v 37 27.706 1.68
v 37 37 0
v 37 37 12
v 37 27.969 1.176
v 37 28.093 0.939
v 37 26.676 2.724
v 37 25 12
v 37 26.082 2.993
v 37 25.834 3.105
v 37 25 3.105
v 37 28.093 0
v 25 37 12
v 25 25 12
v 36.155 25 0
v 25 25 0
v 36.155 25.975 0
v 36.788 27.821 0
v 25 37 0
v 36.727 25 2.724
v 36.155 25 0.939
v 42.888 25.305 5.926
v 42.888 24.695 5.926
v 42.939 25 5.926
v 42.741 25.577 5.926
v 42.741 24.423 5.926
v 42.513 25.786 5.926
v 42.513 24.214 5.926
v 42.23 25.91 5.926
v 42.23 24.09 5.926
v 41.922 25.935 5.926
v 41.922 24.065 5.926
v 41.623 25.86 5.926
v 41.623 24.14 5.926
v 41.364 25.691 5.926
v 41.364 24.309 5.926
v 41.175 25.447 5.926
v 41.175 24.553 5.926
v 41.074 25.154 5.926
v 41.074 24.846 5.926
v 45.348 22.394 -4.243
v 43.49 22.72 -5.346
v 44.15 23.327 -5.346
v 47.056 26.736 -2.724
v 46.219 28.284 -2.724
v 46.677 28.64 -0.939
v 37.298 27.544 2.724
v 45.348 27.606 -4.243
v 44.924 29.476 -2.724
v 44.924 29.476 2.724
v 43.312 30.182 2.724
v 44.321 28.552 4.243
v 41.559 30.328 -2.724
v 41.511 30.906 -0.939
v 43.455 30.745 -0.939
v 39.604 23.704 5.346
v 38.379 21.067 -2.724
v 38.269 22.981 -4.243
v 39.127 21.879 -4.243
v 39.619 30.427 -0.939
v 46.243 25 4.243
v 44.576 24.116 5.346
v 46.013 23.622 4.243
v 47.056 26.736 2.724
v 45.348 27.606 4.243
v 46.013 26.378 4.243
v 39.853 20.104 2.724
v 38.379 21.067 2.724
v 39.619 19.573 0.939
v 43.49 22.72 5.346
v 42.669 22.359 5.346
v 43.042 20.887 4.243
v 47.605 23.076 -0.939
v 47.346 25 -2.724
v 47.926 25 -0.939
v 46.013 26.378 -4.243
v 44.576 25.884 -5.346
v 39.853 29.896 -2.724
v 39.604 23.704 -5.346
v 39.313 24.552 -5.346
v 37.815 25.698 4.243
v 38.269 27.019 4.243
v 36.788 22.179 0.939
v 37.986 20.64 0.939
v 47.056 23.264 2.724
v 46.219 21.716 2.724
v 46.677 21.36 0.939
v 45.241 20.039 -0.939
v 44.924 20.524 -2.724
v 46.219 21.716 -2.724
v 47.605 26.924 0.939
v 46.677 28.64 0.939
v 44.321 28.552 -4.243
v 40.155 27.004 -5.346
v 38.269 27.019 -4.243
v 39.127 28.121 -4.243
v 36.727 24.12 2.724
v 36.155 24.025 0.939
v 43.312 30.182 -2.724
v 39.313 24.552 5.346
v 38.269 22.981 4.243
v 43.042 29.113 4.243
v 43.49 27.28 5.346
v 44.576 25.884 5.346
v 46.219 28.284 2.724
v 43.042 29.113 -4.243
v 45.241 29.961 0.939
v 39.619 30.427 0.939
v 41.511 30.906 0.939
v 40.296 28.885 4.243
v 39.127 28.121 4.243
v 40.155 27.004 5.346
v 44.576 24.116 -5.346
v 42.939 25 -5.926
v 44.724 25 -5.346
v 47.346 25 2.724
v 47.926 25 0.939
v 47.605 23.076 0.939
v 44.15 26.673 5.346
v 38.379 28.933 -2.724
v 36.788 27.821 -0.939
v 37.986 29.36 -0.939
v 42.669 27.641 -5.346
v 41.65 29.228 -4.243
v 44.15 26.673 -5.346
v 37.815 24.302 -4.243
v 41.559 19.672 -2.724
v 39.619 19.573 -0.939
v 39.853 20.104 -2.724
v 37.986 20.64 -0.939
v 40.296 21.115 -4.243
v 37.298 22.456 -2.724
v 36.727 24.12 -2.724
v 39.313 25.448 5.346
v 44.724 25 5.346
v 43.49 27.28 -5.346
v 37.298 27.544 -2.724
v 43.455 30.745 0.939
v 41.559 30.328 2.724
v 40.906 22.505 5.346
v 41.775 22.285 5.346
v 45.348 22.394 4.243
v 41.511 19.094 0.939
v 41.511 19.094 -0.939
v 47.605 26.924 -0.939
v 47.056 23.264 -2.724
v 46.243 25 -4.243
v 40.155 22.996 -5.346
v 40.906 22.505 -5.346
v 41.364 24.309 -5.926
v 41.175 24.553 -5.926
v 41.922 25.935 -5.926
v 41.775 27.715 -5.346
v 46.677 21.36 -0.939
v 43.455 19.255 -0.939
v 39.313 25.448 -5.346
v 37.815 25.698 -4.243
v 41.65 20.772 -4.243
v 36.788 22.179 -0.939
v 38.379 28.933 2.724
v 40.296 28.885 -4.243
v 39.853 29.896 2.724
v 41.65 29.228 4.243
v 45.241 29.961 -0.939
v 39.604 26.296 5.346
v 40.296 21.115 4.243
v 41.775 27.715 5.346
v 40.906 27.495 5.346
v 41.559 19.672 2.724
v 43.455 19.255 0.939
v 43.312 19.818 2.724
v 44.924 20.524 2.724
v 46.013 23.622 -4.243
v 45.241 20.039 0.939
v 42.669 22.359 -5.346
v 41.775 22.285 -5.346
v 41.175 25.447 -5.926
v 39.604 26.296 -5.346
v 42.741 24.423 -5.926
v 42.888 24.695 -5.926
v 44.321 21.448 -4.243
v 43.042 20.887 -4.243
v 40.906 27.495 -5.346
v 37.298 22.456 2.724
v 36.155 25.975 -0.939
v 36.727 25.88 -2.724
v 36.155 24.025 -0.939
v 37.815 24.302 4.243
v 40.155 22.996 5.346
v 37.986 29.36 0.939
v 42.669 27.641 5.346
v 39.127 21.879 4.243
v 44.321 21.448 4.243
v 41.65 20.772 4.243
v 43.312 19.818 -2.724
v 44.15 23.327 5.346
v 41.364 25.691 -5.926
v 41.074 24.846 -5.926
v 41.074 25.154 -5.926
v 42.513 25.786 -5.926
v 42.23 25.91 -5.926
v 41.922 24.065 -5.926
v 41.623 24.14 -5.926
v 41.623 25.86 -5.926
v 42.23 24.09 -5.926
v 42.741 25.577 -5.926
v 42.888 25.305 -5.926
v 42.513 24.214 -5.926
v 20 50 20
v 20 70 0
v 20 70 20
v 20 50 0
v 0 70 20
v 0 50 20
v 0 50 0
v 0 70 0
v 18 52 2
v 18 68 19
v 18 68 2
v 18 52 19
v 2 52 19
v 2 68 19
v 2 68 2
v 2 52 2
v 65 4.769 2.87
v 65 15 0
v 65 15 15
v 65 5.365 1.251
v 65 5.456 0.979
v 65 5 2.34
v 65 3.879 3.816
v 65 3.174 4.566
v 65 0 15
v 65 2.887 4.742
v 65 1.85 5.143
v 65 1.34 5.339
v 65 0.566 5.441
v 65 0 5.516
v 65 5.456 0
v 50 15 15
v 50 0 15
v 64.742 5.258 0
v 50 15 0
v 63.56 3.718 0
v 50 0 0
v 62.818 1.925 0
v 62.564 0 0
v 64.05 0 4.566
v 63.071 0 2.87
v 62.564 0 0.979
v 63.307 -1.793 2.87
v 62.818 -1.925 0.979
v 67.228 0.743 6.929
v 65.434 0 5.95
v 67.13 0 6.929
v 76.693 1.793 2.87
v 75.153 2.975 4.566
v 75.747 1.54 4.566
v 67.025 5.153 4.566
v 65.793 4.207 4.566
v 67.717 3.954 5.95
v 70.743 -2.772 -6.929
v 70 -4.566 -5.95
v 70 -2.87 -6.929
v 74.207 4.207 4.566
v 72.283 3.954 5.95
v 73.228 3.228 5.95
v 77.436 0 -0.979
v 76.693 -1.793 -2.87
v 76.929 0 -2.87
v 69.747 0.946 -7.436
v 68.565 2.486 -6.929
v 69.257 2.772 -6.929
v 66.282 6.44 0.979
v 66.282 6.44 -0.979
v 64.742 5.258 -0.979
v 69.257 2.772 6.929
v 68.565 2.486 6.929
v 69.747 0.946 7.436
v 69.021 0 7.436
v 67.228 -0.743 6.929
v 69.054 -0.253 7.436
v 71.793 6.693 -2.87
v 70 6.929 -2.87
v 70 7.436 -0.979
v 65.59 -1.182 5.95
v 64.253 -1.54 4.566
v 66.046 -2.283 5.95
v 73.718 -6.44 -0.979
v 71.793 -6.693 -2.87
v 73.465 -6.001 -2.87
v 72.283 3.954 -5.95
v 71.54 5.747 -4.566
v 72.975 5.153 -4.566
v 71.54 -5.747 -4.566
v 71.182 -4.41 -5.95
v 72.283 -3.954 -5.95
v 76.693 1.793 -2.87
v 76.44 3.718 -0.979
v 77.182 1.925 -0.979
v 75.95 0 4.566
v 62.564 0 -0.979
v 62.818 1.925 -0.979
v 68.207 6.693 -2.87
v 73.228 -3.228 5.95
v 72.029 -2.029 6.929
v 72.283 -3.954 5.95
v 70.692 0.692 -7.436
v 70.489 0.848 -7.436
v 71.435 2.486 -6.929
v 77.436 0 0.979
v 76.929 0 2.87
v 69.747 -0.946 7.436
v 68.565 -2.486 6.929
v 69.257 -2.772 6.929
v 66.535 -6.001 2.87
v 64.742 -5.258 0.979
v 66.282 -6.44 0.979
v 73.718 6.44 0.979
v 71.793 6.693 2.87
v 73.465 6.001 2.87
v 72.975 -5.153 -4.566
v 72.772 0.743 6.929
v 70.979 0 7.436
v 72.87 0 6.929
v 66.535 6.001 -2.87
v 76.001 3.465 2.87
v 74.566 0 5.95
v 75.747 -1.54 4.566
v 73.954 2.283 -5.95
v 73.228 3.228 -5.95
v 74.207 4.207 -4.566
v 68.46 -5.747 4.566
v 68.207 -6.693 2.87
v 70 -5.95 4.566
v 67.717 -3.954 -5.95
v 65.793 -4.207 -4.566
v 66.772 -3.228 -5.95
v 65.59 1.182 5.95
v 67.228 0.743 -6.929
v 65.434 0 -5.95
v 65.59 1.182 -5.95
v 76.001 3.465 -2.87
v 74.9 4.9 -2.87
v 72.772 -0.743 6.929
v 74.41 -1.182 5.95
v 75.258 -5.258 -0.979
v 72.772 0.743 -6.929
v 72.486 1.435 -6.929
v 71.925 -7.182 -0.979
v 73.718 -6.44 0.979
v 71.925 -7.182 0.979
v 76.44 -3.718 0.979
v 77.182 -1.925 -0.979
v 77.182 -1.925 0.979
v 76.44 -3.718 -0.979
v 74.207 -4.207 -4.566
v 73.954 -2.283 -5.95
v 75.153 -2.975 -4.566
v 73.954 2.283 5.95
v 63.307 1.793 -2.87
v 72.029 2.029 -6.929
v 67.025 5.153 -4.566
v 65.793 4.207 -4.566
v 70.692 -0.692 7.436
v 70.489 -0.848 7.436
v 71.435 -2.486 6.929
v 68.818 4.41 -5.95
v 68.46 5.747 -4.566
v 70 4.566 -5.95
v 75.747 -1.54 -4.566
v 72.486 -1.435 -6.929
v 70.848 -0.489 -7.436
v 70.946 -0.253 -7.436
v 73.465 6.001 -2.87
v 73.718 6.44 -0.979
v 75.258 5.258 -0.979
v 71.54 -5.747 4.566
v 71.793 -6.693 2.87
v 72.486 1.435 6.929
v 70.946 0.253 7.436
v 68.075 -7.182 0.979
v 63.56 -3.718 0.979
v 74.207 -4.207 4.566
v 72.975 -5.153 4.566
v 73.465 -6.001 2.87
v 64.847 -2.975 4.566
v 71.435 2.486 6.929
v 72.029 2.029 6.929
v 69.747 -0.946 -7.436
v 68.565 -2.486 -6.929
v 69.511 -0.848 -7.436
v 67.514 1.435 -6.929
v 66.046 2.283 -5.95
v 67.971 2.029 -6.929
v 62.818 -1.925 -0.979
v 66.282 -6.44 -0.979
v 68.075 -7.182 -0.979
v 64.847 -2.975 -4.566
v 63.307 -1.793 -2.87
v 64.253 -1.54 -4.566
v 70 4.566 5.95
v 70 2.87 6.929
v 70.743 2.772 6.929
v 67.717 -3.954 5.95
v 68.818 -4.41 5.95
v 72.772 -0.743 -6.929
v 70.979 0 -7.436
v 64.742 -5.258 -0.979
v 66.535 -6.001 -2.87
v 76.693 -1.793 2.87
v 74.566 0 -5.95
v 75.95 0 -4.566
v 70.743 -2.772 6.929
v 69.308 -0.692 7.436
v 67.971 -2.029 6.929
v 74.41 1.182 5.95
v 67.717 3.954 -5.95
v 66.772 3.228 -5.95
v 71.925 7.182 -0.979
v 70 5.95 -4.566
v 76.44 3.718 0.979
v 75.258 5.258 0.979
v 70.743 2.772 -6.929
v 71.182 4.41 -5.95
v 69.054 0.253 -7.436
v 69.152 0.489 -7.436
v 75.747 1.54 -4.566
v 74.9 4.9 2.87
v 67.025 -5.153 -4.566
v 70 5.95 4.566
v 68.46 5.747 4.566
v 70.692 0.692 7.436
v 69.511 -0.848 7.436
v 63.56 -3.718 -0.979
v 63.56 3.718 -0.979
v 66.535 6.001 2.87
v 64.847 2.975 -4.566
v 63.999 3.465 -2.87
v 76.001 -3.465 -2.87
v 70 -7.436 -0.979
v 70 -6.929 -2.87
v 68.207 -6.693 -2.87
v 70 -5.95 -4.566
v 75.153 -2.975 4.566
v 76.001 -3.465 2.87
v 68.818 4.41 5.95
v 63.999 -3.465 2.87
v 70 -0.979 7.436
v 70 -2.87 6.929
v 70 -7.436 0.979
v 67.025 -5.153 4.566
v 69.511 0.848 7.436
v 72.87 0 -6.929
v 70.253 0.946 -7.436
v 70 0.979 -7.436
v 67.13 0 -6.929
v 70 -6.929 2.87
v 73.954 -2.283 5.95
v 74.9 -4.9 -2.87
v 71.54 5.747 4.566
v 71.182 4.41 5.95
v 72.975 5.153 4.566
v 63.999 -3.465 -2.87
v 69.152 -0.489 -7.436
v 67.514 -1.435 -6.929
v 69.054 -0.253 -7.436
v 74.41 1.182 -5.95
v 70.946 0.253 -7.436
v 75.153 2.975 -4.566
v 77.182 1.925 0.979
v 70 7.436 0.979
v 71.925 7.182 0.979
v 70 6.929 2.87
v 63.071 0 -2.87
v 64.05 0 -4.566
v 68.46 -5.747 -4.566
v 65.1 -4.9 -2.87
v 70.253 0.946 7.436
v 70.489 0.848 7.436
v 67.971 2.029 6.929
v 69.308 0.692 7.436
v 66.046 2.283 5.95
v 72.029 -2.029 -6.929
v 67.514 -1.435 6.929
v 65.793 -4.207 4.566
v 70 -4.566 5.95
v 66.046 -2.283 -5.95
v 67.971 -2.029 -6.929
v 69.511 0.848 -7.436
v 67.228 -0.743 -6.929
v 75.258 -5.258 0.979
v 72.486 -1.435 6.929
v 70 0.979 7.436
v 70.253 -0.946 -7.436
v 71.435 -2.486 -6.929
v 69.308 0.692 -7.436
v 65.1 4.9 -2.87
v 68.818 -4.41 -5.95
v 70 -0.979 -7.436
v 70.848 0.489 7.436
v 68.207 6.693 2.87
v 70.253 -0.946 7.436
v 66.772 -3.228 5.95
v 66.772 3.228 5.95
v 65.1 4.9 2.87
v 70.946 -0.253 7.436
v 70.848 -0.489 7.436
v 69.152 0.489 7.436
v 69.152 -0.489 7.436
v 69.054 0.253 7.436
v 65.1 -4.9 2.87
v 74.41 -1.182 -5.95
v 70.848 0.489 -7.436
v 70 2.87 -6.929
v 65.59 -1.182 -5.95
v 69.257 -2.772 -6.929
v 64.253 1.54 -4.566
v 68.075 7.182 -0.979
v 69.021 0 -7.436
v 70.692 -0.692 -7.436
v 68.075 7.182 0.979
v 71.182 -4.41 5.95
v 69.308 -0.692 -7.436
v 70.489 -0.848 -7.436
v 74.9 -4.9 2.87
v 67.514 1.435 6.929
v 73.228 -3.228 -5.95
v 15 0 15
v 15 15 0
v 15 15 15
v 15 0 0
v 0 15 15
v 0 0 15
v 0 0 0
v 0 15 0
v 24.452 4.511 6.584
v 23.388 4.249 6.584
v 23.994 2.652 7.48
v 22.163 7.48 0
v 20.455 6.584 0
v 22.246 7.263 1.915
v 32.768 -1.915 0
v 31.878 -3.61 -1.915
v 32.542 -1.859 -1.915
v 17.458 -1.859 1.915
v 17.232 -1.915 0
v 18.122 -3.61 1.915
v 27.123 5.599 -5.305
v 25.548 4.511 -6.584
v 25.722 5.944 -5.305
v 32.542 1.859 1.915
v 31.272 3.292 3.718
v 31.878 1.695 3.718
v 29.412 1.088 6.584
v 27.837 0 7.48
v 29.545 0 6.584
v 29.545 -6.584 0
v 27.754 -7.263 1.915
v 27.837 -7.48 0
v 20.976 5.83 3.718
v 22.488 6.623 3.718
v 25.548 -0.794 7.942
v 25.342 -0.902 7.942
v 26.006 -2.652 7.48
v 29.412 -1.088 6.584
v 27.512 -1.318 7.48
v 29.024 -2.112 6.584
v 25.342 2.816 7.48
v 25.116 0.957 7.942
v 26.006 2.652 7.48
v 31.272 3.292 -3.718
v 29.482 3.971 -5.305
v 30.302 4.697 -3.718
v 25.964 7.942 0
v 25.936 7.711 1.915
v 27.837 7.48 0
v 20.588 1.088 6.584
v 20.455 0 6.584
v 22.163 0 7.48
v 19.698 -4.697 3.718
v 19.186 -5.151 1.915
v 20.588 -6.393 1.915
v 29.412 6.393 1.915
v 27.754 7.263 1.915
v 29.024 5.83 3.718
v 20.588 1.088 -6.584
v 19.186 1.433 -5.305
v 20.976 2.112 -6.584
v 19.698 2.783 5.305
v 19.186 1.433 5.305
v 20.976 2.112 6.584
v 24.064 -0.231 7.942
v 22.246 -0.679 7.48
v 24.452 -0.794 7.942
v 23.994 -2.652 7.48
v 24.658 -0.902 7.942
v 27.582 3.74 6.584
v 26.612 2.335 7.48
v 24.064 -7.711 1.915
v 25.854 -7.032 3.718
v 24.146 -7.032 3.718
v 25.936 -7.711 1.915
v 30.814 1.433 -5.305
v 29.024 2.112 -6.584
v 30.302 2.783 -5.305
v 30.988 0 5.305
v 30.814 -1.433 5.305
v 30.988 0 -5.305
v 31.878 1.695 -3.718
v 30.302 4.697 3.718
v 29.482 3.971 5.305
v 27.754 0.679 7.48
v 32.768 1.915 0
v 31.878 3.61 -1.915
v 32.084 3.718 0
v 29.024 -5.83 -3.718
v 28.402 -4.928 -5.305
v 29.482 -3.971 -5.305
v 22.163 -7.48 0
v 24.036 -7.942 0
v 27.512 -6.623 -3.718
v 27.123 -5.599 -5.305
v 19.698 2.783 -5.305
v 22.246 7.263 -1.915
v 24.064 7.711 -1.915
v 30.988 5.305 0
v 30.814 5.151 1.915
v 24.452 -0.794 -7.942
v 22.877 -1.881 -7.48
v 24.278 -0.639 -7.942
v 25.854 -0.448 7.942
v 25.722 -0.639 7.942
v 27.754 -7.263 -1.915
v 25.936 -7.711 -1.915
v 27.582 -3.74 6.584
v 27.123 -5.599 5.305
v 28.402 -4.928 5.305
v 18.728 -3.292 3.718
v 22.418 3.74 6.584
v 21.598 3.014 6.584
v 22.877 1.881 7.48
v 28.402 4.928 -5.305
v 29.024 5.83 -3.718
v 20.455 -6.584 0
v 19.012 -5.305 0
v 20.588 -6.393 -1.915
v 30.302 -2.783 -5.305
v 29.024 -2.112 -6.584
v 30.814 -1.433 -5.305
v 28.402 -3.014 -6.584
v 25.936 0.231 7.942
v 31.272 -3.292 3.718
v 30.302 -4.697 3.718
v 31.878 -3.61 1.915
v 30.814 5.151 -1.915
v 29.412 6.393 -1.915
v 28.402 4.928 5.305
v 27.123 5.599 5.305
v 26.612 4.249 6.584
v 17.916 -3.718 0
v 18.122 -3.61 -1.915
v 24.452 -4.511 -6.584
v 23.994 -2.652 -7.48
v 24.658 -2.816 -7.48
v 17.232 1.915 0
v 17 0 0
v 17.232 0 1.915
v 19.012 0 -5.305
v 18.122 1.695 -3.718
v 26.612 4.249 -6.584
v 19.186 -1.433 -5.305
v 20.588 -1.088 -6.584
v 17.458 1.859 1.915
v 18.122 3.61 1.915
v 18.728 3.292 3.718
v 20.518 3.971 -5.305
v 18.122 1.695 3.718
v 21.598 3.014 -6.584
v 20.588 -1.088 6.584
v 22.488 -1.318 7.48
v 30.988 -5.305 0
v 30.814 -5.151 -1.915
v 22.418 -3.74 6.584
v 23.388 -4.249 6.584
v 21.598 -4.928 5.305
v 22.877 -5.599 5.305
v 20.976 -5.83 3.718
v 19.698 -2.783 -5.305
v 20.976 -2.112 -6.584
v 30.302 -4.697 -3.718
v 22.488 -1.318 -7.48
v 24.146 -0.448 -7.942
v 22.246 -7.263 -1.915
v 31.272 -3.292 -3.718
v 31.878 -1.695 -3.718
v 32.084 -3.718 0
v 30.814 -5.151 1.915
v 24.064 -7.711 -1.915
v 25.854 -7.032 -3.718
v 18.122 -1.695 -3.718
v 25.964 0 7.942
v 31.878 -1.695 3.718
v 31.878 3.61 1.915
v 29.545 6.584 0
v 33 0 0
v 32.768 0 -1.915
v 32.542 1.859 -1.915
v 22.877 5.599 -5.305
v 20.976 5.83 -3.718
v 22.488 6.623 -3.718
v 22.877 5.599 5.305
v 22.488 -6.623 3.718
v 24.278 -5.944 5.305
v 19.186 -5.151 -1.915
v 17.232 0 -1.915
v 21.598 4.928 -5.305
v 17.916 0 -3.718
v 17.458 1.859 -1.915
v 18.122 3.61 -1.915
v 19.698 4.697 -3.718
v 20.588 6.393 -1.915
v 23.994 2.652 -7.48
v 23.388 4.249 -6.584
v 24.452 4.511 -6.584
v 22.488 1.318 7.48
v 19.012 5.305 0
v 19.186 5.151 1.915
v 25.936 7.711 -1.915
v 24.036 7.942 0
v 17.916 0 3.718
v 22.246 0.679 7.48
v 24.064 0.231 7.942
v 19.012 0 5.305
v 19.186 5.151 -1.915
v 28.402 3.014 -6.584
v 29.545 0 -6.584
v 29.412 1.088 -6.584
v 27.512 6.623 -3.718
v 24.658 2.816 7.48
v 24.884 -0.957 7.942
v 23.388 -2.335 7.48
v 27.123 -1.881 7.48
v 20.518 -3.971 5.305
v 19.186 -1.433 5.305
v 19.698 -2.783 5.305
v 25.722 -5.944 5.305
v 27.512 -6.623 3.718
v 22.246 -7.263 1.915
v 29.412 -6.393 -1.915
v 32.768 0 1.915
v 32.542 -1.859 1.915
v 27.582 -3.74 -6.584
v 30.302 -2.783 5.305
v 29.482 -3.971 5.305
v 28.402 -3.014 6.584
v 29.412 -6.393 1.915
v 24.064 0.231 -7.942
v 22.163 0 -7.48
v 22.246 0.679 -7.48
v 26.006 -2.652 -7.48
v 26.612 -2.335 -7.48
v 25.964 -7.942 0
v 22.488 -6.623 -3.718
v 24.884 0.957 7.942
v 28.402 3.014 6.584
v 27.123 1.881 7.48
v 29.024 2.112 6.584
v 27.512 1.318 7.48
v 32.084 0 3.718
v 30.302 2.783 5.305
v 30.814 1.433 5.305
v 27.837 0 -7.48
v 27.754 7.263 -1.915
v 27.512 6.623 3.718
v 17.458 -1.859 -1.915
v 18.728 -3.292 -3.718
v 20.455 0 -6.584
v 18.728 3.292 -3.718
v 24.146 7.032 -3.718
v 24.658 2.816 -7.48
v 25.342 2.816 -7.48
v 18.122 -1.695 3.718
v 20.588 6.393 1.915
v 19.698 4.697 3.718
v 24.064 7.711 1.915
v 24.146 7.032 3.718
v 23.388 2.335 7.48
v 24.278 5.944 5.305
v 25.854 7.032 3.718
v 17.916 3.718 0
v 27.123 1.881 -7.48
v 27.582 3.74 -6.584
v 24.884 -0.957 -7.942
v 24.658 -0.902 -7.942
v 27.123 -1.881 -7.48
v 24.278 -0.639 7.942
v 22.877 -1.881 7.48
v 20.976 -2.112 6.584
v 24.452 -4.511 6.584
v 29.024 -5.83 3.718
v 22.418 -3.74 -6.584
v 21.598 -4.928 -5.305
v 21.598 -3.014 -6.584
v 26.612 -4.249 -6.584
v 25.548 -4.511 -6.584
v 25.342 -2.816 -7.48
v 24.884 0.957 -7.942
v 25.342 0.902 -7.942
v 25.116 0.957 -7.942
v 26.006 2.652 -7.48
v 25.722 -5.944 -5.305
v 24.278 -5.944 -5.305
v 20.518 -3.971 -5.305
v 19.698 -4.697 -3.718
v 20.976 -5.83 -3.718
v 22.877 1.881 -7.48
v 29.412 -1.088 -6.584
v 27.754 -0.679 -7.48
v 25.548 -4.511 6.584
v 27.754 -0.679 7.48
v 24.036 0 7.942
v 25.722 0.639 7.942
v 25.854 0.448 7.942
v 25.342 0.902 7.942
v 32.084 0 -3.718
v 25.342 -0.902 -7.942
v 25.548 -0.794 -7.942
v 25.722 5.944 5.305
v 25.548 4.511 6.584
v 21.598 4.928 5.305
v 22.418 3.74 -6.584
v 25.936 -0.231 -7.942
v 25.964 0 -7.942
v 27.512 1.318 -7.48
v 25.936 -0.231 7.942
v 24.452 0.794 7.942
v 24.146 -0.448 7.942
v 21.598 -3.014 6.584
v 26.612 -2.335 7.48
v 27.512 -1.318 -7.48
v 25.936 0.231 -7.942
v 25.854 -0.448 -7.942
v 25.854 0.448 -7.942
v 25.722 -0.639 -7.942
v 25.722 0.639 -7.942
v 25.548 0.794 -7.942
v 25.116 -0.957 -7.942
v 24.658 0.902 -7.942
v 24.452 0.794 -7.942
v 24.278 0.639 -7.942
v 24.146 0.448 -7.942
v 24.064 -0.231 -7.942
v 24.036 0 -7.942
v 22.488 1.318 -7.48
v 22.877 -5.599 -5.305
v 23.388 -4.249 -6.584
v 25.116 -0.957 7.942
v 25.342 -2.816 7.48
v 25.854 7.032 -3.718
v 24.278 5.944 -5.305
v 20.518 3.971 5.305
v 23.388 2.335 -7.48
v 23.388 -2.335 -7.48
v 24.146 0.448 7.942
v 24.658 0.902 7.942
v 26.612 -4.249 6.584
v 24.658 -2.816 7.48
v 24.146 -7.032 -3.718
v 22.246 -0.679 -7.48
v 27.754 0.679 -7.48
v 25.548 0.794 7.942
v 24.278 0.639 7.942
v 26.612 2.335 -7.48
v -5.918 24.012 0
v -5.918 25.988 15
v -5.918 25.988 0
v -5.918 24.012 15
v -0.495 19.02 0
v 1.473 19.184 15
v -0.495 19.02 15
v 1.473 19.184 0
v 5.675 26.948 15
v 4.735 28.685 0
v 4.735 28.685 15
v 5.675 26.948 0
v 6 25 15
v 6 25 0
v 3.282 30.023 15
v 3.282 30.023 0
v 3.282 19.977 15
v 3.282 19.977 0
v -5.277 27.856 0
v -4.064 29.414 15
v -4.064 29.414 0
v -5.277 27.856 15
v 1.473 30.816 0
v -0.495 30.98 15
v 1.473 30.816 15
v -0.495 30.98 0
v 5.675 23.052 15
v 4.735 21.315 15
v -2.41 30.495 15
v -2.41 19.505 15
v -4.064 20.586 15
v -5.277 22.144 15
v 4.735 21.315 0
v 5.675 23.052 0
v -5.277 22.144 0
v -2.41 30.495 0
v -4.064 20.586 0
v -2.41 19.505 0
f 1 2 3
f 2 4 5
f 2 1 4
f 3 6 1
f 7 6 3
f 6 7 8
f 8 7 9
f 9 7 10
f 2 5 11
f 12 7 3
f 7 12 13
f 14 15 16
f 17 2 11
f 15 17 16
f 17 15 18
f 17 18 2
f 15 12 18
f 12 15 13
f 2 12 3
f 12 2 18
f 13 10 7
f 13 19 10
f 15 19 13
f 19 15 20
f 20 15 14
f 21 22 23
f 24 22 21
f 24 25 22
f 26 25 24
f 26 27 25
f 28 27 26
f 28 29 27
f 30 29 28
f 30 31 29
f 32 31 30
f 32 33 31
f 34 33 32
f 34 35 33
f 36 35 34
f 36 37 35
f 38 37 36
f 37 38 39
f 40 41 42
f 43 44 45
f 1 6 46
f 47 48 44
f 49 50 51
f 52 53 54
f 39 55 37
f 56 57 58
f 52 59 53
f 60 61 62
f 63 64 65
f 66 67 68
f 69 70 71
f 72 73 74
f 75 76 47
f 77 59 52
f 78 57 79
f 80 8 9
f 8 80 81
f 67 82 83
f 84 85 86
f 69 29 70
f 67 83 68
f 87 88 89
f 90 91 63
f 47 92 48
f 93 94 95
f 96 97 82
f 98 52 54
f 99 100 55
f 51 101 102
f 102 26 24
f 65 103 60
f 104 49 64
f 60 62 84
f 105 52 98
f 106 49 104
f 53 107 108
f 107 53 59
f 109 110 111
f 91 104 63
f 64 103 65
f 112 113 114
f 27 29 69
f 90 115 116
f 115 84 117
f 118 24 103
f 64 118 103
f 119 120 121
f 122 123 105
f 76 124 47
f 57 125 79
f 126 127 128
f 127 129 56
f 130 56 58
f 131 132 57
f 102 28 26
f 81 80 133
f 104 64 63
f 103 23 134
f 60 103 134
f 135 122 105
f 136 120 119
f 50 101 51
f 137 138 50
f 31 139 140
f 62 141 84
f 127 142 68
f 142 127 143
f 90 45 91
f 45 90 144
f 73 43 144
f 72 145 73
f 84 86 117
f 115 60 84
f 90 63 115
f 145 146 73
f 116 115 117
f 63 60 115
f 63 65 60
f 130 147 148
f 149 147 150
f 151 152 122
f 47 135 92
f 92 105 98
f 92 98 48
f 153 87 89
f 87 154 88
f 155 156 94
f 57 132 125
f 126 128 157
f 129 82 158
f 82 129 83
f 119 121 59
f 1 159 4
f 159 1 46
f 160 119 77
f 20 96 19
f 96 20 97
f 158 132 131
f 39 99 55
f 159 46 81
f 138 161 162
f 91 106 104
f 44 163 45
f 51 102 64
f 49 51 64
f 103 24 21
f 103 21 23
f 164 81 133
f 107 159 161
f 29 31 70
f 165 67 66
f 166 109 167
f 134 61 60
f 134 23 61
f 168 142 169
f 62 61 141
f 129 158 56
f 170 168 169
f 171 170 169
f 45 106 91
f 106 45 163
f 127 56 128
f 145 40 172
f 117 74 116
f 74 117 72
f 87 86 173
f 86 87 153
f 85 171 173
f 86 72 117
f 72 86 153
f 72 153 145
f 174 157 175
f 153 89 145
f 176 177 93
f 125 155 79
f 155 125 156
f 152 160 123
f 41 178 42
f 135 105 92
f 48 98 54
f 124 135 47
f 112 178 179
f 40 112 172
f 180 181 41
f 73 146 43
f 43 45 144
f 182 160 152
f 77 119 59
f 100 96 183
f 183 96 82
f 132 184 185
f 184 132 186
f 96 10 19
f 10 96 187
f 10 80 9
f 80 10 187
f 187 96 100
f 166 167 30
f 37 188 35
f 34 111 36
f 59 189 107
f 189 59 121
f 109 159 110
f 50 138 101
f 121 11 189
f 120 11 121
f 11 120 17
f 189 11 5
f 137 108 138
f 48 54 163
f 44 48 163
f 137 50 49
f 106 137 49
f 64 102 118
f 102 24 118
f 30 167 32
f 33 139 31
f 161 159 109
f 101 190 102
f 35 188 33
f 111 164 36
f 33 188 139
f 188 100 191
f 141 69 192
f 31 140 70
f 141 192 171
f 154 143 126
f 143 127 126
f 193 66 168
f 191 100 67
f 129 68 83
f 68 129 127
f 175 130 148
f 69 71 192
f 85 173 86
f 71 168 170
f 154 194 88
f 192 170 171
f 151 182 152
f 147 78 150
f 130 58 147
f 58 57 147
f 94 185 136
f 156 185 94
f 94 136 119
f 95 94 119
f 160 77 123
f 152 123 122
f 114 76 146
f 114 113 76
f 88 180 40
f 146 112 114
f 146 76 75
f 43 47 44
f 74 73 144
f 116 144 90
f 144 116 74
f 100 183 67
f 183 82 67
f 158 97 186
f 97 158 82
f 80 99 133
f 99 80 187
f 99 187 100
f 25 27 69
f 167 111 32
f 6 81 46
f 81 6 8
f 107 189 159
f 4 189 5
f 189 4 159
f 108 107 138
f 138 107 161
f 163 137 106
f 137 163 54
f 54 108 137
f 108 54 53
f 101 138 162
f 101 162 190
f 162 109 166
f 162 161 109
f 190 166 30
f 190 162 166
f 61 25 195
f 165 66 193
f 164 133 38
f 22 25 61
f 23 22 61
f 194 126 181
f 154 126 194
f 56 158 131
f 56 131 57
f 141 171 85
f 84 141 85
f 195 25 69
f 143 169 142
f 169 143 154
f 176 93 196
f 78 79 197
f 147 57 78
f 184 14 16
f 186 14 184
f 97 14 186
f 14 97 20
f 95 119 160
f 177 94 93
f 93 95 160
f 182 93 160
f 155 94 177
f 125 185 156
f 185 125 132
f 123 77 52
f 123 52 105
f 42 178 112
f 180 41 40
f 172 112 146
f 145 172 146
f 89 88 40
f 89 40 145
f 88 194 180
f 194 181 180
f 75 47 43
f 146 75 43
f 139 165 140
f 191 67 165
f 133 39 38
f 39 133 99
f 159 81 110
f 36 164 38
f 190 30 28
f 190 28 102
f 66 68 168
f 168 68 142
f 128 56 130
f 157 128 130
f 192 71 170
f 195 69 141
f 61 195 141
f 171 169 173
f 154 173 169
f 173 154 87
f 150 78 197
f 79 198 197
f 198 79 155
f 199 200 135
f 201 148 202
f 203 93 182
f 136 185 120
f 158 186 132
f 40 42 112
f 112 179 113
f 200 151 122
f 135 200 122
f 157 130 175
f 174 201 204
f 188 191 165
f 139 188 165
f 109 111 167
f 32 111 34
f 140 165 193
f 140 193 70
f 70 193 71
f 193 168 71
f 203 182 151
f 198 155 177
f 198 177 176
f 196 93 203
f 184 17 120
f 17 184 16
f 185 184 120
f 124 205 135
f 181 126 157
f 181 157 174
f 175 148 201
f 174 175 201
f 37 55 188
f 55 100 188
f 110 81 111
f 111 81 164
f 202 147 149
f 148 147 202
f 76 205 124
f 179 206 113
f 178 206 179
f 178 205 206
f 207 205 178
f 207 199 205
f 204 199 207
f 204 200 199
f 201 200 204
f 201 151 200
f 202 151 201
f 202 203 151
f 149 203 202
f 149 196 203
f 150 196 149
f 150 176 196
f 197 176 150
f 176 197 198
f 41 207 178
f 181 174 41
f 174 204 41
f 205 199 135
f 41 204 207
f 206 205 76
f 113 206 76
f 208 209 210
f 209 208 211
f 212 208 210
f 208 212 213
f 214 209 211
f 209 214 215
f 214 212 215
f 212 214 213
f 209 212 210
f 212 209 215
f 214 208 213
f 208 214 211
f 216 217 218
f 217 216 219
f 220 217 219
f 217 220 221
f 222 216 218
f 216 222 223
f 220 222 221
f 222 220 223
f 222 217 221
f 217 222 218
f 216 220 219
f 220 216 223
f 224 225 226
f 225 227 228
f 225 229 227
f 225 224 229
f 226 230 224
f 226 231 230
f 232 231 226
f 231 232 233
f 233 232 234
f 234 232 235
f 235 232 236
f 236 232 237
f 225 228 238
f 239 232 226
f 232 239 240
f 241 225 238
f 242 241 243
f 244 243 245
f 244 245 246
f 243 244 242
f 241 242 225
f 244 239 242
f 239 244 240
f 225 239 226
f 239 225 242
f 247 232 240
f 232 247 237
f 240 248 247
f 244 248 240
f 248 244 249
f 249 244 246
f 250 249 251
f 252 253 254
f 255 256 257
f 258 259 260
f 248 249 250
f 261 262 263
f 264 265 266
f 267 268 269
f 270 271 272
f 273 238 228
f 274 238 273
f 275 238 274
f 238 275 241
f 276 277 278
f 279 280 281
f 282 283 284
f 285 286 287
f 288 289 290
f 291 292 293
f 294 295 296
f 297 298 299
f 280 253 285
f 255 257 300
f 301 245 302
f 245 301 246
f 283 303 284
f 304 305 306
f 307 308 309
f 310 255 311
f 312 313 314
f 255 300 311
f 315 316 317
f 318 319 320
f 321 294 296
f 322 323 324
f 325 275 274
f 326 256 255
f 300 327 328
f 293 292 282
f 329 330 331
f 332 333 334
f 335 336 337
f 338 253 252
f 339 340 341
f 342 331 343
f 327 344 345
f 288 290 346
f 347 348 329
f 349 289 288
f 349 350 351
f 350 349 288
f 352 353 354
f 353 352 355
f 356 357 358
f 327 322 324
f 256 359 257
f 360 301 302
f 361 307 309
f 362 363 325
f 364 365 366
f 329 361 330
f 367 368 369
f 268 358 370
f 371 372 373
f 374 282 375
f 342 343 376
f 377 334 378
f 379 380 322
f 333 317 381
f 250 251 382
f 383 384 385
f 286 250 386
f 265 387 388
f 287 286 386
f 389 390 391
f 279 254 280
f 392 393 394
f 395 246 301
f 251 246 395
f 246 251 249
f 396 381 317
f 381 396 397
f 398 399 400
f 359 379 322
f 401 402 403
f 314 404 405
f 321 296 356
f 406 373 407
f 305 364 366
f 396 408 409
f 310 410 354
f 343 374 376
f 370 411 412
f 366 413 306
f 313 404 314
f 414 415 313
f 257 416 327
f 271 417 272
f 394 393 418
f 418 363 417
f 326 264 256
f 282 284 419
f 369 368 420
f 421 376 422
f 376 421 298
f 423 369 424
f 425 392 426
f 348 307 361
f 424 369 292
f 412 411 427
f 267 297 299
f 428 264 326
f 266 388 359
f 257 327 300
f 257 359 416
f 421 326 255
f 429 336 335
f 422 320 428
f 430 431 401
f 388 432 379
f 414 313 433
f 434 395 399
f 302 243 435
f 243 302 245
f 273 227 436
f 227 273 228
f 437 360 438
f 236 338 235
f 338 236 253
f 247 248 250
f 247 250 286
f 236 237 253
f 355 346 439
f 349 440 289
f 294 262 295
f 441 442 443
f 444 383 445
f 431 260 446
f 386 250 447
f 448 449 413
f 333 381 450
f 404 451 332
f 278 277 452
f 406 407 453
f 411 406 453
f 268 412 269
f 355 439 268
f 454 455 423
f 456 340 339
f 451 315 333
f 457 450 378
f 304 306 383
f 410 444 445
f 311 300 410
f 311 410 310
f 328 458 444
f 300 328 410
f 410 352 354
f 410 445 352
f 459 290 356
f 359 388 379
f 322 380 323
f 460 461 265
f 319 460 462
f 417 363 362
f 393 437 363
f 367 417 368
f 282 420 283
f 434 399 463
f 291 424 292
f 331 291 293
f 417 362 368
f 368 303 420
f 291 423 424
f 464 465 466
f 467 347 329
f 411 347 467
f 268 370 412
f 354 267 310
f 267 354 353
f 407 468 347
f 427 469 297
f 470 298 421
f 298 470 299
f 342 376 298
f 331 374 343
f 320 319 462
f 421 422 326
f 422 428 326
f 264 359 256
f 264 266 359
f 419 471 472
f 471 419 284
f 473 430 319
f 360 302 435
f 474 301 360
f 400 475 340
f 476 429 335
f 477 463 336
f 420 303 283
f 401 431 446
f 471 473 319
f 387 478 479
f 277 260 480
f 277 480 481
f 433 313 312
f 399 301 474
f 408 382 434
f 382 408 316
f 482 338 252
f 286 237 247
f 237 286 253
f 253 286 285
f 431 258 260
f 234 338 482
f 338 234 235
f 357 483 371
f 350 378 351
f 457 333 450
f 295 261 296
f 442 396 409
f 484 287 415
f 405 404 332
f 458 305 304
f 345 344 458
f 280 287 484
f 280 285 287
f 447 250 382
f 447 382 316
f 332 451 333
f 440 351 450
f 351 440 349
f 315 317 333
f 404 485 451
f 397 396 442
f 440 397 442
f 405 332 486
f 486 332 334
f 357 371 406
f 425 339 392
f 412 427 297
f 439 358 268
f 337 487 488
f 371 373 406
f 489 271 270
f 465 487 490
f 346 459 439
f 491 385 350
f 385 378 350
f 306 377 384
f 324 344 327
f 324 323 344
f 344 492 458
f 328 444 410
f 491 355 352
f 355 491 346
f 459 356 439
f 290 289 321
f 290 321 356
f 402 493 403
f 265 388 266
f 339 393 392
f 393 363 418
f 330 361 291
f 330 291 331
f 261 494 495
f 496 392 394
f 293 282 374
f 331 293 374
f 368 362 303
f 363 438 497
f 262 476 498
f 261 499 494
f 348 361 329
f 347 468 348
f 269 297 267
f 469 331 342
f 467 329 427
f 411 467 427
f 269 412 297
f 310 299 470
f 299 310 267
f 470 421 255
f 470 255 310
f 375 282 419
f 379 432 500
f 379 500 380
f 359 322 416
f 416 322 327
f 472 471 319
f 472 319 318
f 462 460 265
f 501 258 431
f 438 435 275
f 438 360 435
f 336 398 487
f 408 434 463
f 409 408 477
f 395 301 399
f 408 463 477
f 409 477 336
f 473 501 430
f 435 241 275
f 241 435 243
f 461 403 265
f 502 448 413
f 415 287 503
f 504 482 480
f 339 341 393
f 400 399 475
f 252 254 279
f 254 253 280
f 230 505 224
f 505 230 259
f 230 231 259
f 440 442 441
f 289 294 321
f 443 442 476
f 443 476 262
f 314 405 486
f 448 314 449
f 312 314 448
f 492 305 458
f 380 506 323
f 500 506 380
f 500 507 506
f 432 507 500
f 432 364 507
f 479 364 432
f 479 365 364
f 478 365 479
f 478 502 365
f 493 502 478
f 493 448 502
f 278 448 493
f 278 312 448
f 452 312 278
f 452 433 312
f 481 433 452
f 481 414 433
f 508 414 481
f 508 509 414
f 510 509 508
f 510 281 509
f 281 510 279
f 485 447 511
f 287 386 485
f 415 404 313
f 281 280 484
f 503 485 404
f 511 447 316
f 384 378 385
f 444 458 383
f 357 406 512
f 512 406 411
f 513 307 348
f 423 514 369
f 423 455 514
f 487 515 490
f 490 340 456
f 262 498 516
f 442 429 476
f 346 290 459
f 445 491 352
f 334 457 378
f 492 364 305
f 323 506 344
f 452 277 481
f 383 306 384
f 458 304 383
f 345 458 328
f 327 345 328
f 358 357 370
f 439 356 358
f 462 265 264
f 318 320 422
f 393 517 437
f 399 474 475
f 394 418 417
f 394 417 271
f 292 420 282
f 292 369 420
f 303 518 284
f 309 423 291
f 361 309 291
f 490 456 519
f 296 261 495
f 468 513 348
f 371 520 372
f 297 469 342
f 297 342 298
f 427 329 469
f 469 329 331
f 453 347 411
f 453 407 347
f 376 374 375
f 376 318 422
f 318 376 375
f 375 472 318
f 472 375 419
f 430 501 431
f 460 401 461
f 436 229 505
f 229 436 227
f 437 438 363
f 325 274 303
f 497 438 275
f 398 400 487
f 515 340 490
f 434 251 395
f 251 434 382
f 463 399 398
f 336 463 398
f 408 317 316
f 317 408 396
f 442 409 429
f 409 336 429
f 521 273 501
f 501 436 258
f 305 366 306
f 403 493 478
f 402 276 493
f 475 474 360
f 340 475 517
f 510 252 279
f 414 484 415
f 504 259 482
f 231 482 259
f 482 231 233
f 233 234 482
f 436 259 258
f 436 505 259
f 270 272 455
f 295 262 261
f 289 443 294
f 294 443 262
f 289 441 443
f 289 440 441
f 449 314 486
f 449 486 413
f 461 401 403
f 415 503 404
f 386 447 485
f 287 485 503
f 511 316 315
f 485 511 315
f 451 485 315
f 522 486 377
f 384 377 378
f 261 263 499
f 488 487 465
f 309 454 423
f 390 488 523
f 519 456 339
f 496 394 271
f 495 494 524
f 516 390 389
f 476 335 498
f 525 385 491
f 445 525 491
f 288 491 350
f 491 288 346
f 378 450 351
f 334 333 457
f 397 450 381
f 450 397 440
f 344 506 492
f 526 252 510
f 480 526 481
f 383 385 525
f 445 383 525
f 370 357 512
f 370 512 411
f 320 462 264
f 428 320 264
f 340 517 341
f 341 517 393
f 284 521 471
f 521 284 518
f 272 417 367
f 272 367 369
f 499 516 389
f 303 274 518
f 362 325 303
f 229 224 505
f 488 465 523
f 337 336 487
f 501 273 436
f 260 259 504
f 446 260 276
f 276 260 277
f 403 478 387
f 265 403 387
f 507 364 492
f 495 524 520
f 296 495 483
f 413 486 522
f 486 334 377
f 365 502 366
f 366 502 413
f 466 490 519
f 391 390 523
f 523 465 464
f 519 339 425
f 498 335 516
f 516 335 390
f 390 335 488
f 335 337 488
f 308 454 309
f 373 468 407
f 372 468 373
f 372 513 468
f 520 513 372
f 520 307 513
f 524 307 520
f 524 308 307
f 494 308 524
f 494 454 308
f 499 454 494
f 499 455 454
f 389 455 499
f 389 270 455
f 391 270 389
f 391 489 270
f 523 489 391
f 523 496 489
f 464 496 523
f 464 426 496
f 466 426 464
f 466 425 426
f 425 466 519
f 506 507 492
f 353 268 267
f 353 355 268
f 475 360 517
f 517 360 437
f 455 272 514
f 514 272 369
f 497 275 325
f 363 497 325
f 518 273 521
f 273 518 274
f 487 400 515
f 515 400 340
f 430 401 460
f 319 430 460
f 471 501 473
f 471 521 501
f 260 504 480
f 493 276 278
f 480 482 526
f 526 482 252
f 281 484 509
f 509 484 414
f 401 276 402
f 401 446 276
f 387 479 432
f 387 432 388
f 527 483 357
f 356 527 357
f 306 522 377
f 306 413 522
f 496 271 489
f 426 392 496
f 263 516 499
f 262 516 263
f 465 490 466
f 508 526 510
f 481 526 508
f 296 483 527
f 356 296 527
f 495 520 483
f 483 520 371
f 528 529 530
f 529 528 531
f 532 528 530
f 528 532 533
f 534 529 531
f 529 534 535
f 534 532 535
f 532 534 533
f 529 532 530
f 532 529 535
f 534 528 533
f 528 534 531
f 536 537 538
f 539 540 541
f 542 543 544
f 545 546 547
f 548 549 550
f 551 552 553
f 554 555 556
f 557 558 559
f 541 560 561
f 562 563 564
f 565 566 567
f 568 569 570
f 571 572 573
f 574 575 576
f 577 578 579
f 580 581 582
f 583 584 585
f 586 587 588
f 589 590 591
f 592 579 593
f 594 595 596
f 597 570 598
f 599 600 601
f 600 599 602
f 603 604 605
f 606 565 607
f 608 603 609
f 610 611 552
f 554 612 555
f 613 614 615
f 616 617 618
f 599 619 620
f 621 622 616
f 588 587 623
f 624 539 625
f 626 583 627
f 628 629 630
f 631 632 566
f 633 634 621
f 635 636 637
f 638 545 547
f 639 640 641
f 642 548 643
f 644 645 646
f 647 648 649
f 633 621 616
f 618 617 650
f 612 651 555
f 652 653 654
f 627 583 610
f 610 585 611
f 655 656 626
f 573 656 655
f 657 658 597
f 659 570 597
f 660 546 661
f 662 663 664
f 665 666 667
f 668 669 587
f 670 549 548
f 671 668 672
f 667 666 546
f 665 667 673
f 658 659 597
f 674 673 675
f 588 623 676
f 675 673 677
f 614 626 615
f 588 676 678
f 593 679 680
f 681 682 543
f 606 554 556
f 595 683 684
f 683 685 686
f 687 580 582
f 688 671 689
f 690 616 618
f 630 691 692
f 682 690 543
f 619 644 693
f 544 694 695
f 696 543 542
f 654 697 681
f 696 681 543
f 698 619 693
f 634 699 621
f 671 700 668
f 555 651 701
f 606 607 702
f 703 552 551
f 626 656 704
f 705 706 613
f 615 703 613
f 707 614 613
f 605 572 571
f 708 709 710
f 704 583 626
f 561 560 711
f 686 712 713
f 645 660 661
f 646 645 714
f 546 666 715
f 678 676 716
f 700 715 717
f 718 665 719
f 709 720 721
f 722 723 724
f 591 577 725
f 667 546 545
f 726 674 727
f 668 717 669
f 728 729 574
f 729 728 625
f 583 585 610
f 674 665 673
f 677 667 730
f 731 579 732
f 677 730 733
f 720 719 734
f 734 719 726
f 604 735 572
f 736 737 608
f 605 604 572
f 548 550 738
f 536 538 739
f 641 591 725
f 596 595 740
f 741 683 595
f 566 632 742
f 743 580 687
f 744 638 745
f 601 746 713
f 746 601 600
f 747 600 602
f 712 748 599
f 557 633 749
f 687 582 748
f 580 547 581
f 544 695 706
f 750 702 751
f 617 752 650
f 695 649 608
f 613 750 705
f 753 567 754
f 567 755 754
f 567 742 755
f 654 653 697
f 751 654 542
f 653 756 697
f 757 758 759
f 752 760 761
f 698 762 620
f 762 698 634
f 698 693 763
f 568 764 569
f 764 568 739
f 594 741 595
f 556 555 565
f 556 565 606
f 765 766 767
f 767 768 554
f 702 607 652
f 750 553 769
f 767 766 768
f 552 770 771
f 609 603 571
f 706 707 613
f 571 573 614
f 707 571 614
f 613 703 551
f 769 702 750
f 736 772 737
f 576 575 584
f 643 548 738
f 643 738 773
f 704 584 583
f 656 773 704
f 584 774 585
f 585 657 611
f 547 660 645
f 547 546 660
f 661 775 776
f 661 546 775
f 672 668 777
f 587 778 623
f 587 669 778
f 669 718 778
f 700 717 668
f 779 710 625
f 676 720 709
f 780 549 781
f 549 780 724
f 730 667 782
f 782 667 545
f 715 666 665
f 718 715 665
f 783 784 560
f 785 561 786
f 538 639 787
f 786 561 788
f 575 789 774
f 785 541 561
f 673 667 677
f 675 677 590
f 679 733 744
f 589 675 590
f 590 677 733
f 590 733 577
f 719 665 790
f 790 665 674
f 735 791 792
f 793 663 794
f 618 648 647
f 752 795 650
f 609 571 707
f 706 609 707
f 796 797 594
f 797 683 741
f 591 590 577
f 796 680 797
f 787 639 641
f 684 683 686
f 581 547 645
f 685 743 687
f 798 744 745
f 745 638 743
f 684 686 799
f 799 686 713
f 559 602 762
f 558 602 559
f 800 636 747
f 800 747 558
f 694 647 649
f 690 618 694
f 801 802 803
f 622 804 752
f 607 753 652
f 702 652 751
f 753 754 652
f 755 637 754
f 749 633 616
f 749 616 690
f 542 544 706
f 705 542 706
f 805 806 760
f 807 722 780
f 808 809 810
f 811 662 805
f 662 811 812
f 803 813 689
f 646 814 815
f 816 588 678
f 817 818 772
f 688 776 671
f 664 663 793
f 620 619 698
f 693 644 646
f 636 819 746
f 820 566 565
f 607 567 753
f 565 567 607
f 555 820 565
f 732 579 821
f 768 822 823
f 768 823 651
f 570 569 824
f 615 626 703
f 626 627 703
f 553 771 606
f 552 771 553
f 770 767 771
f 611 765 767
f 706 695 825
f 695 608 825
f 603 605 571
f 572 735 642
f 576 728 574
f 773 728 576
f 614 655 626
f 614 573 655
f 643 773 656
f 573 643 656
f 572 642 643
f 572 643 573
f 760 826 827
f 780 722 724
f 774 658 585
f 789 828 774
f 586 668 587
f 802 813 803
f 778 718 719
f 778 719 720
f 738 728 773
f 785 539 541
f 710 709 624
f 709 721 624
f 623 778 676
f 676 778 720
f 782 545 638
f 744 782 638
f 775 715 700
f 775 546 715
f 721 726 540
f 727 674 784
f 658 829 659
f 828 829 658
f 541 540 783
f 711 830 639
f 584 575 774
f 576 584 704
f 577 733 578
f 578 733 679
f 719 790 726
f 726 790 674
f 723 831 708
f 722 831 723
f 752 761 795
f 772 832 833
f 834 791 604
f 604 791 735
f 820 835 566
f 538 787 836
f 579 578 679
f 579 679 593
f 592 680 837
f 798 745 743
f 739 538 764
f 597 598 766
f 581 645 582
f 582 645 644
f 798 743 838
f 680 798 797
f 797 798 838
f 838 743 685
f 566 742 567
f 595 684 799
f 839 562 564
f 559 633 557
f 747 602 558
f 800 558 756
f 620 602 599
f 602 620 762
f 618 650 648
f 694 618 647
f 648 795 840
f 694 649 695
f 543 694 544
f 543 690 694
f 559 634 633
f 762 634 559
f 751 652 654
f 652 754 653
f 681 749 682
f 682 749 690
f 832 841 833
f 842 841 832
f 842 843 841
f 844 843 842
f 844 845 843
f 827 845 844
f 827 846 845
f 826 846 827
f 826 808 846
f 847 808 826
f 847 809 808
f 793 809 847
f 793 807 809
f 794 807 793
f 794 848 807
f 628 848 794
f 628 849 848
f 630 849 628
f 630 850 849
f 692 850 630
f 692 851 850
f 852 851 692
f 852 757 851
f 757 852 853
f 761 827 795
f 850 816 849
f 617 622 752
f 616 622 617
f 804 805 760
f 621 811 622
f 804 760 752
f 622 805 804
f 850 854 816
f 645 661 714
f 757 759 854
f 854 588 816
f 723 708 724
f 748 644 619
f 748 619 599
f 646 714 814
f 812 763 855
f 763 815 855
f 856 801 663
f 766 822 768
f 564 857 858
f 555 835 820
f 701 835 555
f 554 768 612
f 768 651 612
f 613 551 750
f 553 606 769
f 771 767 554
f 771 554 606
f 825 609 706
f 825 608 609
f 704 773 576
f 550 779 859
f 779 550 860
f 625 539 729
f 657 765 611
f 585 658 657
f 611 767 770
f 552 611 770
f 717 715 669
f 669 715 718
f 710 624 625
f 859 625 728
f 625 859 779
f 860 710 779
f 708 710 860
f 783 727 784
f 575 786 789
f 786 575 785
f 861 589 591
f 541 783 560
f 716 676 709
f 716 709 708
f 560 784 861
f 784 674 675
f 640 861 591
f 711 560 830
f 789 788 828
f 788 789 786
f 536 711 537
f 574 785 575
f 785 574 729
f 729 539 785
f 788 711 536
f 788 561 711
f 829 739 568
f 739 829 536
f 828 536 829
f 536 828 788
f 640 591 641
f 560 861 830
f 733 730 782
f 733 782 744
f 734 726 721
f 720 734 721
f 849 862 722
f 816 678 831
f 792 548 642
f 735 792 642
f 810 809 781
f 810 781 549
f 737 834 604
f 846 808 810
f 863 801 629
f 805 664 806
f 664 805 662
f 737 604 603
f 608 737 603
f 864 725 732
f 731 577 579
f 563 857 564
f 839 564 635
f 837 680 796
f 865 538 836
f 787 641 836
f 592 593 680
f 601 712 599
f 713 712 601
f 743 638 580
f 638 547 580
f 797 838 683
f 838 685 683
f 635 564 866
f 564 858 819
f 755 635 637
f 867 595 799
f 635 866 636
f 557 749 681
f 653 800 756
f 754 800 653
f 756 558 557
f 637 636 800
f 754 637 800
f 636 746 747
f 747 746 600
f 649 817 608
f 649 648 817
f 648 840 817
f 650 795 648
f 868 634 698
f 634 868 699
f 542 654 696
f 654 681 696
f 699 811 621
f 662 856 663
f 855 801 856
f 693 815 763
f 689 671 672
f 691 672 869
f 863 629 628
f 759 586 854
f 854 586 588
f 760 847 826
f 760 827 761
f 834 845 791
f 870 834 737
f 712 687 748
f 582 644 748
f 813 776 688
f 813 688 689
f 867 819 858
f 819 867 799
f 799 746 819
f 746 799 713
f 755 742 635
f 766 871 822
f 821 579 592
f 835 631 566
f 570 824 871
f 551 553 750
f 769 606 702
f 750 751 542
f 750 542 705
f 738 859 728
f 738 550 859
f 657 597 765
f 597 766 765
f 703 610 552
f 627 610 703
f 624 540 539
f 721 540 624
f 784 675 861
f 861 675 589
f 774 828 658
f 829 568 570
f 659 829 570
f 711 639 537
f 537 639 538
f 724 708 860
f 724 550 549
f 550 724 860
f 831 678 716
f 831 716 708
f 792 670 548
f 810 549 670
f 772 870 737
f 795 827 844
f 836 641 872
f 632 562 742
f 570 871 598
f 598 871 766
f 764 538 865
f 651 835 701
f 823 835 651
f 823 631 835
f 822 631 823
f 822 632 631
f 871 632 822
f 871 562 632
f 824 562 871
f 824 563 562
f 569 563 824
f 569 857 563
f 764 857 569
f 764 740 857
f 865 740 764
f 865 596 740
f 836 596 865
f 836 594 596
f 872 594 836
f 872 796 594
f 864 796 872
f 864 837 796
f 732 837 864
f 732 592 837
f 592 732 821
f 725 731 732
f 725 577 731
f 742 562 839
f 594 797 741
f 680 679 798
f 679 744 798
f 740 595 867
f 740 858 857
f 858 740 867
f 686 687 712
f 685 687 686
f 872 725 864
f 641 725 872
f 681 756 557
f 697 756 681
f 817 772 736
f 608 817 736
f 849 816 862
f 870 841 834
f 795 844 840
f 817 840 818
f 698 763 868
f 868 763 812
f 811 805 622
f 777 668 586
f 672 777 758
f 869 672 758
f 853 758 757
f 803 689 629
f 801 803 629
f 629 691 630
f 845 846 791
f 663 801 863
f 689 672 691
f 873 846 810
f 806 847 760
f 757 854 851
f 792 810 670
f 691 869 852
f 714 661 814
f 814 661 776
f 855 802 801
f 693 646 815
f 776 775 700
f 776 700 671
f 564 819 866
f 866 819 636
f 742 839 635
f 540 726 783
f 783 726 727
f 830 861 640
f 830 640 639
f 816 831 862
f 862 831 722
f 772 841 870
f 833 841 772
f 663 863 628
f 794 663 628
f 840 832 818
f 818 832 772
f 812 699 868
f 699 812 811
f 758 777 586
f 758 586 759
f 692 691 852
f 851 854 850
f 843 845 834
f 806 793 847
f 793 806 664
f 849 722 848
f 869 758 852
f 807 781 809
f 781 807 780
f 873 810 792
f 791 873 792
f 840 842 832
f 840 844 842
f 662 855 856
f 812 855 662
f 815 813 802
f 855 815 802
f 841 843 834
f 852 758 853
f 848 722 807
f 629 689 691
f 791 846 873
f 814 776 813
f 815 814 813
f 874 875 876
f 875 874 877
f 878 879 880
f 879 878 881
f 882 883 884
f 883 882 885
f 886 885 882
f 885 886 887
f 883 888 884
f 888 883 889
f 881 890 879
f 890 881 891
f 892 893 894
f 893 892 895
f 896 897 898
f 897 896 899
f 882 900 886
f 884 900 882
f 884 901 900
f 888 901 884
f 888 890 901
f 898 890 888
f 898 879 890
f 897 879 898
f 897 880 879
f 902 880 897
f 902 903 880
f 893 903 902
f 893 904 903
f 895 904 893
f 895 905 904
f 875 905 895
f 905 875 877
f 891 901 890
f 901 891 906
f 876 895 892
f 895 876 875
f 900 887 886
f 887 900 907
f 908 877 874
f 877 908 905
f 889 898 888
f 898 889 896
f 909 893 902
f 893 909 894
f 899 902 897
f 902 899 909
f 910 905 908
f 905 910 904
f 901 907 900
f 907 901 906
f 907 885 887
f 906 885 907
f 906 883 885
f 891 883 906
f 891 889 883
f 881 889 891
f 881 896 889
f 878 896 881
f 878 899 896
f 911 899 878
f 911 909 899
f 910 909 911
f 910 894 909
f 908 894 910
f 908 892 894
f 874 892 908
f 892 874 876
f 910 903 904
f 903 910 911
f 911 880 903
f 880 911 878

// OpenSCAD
// file: utils.scad
// Utility functions and constants

// Global constants
wall_thickness = 2;
default_height = 20;

// Helper function to calculate volume of a box
function box_volume(length, width, height) = length * width * height;

// Helper function to calculate area
function calculate_area(length, width) = length * width;

// Module to create a hollow box
module hollow_box(outer_size, wall = wall_thickness) {
    difference() {
        cube([outer_size, outer_size, outer_size]);
        translate([wall, wall, wall]) {
            cube([outer_size - 2*wall, outer_size - 2*wall, outer_size - 2*wall + 1]);
        }
    }
}
// file: shapes.scad
// Shape module definitions

// A simple cube shape with configurable size
module cube_shape(size = 10) {
    cube([size, size, size]);
}

// A sphere shape with configurable radius
module sphere_shape(radius = 5) {
    sphere(r = radius);
}

// A cylinder shape with configurable dimensions
module cylinder_shape(height = 10, radius = 5) {
    cylinder(h = height, r = radius);
}

// Combined shape module
module combined_shape(cube_size = 10, sphere_radius = 5) {
    union() {
        cube_shape(cube_size);
        translate([cube_size + 5, 0, 0]) {
            sphere_shape(sphere_radius);
        }
    }
}
// main file
// Main file demonstrating OpenSCAD features

use <shapes.scad>
use <utils.scad>

// Local variable
model_scale = 1.5;

// Using modules from shapes.scad
cube_shape(15);

translate([25, 0, 0]) {
    sphere_shape(8);
}

translate([0, 25, 0]) {
    cylinder_shape(height = 15, radius = 6);
}

// Using combined shape
translate([25, 25, 0]) {
    combined_shape(12, 6);
}

// Using utilities
translate([0, 50, 0]) {
    hollow_box(20);
}

// Using function from utils
box_vol = box_volume(10, 10, 10);
echo("Box volume:", box_vol);

// Local module definition
module local_assembly() {
    cube_shape(model_scale * 10);
    translate([20, 0, 0]) {
        sphere_shape(model_scale * 5);
    }
}

// Using local module
translate([50, 0, 0]) {
    local_assembly();
}
